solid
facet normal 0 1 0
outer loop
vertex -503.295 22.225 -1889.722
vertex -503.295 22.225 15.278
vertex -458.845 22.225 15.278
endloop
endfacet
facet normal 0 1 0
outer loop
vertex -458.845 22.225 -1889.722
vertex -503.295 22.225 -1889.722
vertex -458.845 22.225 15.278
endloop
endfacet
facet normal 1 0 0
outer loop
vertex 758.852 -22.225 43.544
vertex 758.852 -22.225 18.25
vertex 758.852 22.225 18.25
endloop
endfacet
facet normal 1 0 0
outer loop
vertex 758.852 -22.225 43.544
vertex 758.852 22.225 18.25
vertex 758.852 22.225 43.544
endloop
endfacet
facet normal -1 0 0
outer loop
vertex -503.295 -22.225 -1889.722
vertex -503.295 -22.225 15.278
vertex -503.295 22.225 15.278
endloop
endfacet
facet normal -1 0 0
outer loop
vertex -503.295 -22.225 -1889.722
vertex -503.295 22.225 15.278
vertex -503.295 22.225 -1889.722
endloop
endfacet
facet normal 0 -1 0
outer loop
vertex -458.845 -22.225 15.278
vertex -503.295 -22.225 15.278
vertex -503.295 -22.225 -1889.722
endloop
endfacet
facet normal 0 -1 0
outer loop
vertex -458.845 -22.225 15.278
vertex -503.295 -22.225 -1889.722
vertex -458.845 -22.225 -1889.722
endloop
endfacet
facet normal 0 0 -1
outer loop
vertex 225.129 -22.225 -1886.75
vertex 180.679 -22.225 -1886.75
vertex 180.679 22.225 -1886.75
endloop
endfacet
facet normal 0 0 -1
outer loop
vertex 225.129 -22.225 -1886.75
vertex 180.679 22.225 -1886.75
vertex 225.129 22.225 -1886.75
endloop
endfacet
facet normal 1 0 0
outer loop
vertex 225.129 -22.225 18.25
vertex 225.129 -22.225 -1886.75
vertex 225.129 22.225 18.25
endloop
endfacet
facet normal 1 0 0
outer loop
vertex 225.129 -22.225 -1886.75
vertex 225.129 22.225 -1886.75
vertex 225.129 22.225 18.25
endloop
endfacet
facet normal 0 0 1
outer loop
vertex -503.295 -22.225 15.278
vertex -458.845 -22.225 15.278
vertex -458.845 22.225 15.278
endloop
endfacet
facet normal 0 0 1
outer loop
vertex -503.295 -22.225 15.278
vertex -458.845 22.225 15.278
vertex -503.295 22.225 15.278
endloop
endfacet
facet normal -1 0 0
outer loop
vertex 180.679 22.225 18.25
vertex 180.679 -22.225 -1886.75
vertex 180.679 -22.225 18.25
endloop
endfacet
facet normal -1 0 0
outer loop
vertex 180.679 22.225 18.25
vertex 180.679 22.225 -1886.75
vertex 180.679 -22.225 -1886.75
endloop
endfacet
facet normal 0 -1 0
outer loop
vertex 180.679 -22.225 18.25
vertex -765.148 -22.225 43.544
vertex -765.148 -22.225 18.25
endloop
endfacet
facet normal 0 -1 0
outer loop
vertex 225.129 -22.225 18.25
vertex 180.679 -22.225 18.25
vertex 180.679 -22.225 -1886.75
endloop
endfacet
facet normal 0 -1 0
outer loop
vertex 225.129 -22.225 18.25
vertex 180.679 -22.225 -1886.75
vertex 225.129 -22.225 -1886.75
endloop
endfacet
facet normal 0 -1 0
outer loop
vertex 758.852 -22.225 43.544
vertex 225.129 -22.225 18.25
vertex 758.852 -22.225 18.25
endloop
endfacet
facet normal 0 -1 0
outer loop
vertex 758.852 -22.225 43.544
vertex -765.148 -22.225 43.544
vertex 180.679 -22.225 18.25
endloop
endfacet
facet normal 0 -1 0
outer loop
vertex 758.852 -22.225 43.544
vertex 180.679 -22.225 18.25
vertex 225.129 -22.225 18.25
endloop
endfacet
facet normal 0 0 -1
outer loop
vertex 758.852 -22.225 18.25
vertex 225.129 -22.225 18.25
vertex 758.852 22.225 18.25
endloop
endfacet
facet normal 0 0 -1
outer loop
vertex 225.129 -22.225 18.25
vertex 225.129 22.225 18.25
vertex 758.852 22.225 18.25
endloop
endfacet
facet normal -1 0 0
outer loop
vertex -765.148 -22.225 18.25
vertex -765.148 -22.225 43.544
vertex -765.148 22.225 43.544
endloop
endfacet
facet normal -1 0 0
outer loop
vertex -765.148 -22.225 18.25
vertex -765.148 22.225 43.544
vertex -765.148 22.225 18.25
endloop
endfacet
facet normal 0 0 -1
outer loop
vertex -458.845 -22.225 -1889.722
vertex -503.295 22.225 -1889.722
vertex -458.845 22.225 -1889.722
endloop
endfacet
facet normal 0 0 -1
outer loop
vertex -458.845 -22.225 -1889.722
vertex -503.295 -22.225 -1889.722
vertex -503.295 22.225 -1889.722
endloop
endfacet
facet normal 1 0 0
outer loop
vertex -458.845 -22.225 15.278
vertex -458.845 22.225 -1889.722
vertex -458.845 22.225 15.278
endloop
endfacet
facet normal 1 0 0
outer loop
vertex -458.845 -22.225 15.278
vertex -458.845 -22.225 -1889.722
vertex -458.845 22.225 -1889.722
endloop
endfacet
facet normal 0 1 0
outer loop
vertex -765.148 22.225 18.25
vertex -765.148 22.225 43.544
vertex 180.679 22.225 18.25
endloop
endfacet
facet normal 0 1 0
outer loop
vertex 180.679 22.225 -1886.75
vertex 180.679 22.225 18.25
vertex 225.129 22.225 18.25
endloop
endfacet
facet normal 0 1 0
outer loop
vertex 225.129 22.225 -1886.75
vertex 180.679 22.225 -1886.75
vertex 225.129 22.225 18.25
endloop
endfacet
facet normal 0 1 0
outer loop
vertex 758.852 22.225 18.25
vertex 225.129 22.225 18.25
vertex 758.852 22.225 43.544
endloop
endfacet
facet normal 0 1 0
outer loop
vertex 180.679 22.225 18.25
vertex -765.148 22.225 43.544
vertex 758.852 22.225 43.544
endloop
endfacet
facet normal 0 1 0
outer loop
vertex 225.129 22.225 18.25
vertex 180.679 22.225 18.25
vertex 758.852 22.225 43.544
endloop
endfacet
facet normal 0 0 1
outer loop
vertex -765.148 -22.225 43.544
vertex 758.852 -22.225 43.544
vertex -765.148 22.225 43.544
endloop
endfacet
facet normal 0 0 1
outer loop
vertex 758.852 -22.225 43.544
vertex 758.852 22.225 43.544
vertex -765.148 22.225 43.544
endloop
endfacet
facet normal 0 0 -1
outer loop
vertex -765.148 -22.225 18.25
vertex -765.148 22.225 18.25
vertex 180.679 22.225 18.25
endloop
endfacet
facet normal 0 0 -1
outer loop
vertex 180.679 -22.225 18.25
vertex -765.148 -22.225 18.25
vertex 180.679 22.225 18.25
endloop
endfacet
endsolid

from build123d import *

# Parameters (mm, degrees)
F0_W     = 44.45
F0_H     = 1905
F1_DEPTH = 22.225


with BuildPart() as f1:
    # F0 (on Front) → F1 (new body, symmetric)
    with BuildSketch(Plane.XZ):
        with Locations((202.903606, -934.250364)):
            Rectangle(F0_W, F0_H)
        Polygon((758.852018, 43.544176), (-765.147982, 43.544176), (-765.147982, 18.249636), (180.678606, 18.249636), (225.128606, 18.249636), (758.852018, 18.249636), align=None)
        Polygon((-458.845004, -1889.722198), (-458.845004, -632.672131), (-458.845004, 15.277802), (-503.295004, 15.277802), (-503.295004, -1889.722198), align=None)
    extrude(amount=F1_DEPTH, both=True)


solid = f1.part
